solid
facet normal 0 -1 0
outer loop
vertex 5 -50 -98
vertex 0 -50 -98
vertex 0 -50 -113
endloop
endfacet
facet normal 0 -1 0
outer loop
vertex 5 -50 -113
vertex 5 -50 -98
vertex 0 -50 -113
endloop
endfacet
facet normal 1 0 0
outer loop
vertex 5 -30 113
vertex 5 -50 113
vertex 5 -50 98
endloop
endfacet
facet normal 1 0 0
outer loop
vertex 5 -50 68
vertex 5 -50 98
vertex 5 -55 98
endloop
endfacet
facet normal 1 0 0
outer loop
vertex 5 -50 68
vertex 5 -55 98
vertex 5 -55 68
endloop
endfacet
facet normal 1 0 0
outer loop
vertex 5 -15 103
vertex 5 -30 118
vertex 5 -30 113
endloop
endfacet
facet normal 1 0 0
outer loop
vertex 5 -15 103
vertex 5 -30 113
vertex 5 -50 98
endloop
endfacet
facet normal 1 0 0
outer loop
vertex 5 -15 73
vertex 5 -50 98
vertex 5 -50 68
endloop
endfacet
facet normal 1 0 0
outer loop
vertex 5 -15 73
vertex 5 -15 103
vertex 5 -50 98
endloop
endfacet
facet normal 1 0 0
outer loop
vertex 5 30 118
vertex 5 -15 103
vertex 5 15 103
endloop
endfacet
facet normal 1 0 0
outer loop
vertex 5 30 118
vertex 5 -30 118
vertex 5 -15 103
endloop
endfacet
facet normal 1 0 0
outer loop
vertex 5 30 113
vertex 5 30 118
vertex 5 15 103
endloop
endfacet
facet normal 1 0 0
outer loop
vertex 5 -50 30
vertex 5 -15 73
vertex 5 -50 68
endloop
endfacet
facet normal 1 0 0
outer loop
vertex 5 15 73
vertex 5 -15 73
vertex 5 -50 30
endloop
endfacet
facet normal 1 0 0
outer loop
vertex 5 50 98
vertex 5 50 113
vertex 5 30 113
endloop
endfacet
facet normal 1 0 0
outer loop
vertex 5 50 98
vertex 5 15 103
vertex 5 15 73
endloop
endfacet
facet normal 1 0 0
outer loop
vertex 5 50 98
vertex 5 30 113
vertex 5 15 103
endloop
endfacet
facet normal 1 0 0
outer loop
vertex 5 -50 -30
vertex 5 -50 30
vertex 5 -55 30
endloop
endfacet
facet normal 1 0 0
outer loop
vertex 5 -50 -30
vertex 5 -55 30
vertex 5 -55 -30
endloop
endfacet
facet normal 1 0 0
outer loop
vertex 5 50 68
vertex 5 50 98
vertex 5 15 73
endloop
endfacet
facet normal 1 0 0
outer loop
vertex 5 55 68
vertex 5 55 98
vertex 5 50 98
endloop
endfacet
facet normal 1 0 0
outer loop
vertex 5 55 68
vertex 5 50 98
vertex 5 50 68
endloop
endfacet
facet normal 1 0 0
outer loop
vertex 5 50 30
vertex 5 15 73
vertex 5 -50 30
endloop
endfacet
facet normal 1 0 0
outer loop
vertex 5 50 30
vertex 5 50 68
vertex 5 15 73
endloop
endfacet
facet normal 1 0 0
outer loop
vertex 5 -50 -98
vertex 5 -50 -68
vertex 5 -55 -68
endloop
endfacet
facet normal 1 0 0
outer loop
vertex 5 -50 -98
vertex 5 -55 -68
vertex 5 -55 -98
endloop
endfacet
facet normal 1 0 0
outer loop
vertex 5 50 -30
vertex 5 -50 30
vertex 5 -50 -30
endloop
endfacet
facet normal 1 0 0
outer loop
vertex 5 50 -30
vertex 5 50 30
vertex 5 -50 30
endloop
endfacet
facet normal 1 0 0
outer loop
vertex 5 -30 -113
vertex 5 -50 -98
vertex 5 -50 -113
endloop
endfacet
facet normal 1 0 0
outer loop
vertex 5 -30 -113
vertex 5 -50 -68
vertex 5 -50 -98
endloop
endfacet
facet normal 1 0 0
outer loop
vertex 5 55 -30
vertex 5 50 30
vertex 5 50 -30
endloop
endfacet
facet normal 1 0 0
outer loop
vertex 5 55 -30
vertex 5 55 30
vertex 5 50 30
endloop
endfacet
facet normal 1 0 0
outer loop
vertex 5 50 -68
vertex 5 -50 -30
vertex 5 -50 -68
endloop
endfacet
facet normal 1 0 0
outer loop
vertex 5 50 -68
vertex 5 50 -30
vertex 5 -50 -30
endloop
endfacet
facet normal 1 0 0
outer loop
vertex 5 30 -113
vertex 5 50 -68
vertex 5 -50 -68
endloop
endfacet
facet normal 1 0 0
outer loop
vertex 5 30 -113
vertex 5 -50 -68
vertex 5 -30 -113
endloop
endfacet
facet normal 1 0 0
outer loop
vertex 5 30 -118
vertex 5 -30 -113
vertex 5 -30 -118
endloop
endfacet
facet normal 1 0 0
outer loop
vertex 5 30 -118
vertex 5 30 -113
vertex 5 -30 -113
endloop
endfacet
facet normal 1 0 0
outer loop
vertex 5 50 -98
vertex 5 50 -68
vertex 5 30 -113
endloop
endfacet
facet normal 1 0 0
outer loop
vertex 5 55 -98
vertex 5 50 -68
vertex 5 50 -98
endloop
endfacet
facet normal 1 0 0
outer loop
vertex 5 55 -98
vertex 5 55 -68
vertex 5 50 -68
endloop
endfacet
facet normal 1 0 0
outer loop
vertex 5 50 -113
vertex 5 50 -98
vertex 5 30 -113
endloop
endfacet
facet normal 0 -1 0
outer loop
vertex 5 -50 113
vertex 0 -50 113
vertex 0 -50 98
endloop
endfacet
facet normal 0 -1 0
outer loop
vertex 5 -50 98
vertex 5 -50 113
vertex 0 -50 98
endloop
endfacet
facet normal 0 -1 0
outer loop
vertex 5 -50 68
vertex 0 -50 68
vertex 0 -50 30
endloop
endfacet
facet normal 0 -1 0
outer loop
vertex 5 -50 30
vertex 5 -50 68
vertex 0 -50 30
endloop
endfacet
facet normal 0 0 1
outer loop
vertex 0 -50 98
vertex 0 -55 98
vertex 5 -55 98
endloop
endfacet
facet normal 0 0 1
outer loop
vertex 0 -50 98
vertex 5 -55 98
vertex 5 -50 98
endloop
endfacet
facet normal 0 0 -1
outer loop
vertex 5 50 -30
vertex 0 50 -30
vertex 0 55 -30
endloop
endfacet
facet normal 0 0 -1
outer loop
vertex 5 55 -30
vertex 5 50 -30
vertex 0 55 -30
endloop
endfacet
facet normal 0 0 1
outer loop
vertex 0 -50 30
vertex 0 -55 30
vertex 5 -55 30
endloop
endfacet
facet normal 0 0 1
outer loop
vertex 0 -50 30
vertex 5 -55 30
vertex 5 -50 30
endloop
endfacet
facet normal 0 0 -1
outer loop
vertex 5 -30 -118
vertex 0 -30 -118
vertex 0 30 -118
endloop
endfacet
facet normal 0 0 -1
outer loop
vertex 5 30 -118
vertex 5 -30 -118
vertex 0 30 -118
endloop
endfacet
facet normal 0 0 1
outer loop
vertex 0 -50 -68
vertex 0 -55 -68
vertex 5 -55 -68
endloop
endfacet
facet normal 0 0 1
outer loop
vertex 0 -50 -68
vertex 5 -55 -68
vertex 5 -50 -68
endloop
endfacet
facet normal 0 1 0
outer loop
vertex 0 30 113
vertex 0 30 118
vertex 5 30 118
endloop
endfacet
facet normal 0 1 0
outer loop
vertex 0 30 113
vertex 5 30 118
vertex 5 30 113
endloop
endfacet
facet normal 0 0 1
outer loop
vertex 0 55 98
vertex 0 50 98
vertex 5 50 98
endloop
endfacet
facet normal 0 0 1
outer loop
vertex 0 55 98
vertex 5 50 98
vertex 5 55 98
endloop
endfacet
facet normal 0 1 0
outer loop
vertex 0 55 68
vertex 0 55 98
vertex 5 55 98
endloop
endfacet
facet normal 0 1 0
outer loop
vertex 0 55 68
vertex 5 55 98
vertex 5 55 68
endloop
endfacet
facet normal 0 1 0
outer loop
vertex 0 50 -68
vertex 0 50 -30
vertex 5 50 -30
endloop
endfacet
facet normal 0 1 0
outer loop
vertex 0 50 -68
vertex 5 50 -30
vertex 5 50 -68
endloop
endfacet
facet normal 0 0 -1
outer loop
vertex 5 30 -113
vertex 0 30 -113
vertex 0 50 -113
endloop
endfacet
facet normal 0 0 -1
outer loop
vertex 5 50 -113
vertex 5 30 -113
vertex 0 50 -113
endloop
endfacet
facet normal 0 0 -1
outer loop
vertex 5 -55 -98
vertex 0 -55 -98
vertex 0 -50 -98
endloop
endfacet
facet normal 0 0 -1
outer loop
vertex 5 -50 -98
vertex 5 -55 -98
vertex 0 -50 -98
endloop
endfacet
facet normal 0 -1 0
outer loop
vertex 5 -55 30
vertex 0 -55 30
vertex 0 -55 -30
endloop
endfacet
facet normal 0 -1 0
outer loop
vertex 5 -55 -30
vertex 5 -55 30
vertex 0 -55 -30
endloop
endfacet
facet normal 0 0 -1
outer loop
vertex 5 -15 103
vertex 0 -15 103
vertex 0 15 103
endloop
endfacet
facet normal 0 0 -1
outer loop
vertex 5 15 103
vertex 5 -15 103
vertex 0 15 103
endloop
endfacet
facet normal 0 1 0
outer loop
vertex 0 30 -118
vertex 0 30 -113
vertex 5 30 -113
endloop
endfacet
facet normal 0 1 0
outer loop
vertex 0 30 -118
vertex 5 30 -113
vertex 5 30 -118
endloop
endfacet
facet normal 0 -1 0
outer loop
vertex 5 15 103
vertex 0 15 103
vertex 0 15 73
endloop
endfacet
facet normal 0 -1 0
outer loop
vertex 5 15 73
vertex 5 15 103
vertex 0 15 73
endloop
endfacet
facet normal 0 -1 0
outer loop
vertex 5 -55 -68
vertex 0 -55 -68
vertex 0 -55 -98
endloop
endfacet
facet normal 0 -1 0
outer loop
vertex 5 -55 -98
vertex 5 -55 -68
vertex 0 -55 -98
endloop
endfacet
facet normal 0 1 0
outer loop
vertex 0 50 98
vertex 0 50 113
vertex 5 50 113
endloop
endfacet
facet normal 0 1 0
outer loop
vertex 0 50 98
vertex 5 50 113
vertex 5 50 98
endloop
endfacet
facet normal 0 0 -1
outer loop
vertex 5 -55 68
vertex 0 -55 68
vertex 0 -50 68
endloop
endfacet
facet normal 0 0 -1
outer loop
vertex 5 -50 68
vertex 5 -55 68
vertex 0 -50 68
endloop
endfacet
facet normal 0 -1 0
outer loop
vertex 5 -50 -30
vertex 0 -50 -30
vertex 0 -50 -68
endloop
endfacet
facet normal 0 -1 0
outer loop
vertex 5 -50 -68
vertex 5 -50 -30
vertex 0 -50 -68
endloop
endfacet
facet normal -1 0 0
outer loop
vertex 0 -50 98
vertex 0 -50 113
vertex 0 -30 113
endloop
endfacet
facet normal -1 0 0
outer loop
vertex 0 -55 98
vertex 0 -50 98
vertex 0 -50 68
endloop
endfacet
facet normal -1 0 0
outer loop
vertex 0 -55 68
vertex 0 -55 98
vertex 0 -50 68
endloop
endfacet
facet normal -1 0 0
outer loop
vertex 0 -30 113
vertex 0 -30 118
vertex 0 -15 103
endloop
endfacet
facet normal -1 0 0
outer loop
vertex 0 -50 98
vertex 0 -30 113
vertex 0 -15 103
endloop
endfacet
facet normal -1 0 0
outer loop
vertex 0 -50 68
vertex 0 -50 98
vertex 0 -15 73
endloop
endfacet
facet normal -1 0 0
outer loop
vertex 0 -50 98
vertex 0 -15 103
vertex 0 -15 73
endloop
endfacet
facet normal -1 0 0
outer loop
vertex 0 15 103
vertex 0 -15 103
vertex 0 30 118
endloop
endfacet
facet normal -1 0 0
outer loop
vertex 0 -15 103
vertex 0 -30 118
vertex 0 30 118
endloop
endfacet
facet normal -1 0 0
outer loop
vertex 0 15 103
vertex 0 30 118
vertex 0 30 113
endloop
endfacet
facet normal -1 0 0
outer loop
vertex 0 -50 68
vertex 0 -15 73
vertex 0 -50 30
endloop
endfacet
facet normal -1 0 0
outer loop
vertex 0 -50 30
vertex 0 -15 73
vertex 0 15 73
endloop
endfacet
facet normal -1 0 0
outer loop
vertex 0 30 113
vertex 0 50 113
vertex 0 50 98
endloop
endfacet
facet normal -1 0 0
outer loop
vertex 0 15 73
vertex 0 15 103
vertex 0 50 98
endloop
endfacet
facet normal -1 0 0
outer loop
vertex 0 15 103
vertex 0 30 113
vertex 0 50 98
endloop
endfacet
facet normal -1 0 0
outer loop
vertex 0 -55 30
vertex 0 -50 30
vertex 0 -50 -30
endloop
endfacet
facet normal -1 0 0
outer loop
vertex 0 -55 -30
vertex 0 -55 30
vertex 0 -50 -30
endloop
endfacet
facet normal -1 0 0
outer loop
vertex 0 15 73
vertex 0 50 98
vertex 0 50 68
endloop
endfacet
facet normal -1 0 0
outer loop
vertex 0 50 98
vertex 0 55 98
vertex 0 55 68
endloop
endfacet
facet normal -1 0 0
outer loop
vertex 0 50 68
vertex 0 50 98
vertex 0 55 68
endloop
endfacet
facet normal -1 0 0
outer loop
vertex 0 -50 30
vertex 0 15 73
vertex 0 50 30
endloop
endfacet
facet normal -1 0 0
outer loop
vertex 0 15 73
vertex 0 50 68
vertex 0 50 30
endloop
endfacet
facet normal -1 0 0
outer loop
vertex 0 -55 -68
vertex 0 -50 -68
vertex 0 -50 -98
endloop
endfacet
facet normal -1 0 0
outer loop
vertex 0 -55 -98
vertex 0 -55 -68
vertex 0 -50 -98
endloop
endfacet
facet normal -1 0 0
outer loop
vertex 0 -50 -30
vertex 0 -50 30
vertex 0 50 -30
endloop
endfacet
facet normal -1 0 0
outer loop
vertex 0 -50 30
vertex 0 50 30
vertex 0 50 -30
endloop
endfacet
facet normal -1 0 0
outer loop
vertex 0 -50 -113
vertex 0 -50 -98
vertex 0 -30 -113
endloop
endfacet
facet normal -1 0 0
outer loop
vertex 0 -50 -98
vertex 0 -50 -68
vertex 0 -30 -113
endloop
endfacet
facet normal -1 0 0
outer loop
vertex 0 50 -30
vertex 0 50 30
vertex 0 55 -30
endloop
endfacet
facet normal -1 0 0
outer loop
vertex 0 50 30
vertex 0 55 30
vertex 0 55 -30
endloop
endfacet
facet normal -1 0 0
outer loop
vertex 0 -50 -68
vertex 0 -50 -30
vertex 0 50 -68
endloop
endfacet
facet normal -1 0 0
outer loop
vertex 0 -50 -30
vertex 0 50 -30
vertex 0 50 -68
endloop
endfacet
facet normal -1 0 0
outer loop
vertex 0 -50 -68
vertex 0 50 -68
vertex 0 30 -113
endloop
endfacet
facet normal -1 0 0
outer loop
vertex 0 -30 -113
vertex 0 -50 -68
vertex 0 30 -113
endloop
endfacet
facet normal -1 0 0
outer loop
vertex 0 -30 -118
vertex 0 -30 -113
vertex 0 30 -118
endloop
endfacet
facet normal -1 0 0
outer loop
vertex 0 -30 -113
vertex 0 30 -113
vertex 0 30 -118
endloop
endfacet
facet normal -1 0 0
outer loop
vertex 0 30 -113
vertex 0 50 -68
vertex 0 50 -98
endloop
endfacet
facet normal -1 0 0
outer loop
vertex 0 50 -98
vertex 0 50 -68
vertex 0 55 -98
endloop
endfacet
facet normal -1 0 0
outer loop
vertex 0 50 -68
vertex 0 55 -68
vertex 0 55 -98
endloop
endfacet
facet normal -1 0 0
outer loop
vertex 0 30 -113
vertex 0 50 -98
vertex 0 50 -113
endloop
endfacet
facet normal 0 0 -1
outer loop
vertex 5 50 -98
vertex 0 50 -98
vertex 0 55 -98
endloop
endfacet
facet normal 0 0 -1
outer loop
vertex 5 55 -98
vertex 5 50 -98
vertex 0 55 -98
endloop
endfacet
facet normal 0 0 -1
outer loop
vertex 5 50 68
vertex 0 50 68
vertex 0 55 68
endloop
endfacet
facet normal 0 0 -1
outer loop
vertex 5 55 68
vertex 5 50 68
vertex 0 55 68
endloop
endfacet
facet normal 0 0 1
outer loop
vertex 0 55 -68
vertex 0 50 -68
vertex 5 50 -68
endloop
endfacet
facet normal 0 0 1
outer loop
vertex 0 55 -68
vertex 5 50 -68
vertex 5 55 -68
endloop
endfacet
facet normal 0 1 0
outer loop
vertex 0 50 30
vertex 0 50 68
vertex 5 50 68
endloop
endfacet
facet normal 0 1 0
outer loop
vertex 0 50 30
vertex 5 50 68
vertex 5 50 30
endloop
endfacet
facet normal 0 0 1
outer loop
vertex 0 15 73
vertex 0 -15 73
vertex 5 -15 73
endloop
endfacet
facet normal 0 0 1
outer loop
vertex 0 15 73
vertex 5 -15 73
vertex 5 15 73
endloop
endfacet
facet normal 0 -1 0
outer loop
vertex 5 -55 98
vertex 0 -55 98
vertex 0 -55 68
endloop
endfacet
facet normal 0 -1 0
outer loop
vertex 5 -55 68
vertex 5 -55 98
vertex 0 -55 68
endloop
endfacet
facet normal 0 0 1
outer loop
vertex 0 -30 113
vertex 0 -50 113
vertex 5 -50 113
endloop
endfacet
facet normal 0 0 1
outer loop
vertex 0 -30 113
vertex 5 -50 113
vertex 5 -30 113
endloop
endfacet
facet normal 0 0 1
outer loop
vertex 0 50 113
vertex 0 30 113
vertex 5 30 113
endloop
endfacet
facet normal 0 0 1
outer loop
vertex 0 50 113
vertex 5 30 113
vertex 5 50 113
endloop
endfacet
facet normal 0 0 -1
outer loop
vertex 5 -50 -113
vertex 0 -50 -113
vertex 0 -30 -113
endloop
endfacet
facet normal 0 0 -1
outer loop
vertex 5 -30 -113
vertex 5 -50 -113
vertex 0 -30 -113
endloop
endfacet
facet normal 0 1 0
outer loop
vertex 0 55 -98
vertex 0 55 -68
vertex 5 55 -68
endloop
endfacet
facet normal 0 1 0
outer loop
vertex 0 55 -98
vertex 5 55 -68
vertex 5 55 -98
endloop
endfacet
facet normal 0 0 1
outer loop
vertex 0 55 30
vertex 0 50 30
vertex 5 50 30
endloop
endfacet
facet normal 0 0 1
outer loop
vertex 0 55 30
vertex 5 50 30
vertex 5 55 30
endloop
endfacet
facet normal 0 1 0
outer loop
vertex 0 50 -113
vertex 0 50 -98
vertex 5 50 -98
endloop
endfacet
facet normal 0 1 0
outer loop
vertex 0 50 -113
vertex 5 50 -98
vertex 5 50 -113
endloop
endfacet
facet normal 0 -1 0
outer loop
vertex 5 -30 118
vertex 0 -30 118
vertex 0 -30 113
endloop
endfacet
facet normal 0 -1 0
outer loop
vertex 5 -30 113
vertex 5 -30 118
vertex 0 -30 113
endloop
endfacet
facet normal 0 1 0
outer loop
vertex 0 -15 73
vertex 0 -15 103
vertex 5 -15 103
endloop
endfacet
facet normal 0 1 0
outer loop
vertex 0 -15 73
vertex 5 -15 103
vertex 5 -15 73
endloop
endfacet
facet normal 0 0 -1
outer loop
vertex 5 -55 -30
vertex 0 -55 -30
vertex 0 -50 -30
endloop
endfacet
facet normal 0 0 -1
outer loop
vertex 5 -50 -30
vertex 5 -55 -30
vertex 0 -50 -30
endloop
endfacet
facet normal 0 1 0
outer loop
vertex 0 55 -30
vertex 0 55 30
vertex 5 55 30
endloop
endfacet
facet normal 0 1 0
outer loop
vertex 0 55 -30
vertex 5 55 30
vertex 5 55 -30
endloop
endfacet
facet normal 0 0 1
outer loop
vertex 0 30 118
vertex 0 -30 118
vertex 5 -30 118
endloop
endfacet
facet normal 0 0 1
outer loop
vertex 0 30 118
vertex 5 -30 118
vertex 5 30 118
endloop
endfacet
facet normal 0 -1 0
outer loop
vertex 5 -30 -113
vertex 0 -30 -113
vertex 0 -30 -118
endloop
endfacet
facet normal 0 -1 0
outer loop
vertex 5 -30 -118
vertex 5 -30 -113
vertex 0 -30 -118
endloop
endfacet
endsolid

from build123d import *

# Parameters (mm, degrees)
SKETCH1_W           = 226
SKETCH1_H           = 100
SKETCH1_W_2         = 30
SKETCH1_H_2         = 30
SKETCH1_W_3         = 5
SKETCH1_H_3         = 60
SKETCH1_H_4         = 5
SKETCH1_W_4         = 60
BOSS_EXTRUDE1_DEPTH = 5


with BuildPart() as part:
    # Sketch1 → Boss-Extrude1 (new body)
    # profile 1 of 9: a face of its own
    with BuildSketch(Plane(origin=(0, 0, 0), x_dir=(0, 0, -1), z_dir=(1, 0, 0))):
        Rectangle(SKETCH1_W, SKETCH1_H)
        with Locations((-88, 0)):
            Rectangle(SKETCH1_W_2, SKETCH1_H_2, mode=Mode.SUBTRACT)
    # profile 2 of 9: a face of its own
    with BuildSketch(Plane(origin=(0, 0, 0), x_dir=(0, 0, -1), z_dir=(1, 0, 0))):
        with Locations((115.5, 0)):
            Rectangle(SKETCH1_W_3, SKETCH1_H_3)
    # profile 3 of 9: a face of its own
    with BuildSketch(Plane(origin=(0, 0, 0), x_dir=(0, 0, -1), z_dir=(1, 0, 0))):
        with Locations((83, 52.5)):
            Rectangle(SKETCH1_W_2, SKETCH1_H_4)
    # profile 4 of 9: a face of its own
    with BuildSketch(Plane(origin=(0, 0, 0), x_dir=(0, 0, -1), z_dir=(1, 0, 0))):
        with Locations((0, 52.5)):
            Rectangle(SKETCH1_W_4, SKETCH1_H_4)
    # profile 5 of 9: a face of its own
    with BuildSketch(Plane(origin=(0, 0, 0), x_dir=(0, 0, -1), z_dir=(1, 0, 0))):
        with Locations((83, -52.5)):
            Rectangle(SKETCH1_W_2, SKETCH1_H_4)
    # profile 6 of 9: a face of its own
    with BuildSketch(Plane(origin=(0, 0, 0), x_dir=(0, 0, -1), z_dir=(1, 0, 0))):
        with Locations((0, -52.5)):
            Rectangle(SKETCH1_W_4, SKETCH1_H_4)
    # profile 7 of 9: a face of its own
    with BuildSketch(Plane(origin=(0, 0, 0), x_dir=(0, 0, -1), z_dir=(1, 0, 0))):
        with Locations((-83, -52.5)):
            Rectangle(SKETCH1_W_2, SKETCH1_H_4)
    # profile 8 of 9: a face of its own
    with BuildSketch(Plane(origin=(0, 0, 0), x_dir=(0, 0, -1), z_dir=(1, 0, 0))):
        with Locations((-115.5, 0)):
            Rectangle(SKETCH1_W_3, SKETCH1_H_3)
    # profile 9 of 9: a face of its own
    with BuildSketch(Plane(origin=(0, 0, 0), x_dir=(0, 0, -1), z_dir=(1, 0, 0))):
        with Locations((-83, 52.5)):
            Rectangle(SKETCH1_W_2, SKETCH1_H_4)
    extrude(amount=BOSS_EXTRUDE1_DEPTH)


solid = part.part
